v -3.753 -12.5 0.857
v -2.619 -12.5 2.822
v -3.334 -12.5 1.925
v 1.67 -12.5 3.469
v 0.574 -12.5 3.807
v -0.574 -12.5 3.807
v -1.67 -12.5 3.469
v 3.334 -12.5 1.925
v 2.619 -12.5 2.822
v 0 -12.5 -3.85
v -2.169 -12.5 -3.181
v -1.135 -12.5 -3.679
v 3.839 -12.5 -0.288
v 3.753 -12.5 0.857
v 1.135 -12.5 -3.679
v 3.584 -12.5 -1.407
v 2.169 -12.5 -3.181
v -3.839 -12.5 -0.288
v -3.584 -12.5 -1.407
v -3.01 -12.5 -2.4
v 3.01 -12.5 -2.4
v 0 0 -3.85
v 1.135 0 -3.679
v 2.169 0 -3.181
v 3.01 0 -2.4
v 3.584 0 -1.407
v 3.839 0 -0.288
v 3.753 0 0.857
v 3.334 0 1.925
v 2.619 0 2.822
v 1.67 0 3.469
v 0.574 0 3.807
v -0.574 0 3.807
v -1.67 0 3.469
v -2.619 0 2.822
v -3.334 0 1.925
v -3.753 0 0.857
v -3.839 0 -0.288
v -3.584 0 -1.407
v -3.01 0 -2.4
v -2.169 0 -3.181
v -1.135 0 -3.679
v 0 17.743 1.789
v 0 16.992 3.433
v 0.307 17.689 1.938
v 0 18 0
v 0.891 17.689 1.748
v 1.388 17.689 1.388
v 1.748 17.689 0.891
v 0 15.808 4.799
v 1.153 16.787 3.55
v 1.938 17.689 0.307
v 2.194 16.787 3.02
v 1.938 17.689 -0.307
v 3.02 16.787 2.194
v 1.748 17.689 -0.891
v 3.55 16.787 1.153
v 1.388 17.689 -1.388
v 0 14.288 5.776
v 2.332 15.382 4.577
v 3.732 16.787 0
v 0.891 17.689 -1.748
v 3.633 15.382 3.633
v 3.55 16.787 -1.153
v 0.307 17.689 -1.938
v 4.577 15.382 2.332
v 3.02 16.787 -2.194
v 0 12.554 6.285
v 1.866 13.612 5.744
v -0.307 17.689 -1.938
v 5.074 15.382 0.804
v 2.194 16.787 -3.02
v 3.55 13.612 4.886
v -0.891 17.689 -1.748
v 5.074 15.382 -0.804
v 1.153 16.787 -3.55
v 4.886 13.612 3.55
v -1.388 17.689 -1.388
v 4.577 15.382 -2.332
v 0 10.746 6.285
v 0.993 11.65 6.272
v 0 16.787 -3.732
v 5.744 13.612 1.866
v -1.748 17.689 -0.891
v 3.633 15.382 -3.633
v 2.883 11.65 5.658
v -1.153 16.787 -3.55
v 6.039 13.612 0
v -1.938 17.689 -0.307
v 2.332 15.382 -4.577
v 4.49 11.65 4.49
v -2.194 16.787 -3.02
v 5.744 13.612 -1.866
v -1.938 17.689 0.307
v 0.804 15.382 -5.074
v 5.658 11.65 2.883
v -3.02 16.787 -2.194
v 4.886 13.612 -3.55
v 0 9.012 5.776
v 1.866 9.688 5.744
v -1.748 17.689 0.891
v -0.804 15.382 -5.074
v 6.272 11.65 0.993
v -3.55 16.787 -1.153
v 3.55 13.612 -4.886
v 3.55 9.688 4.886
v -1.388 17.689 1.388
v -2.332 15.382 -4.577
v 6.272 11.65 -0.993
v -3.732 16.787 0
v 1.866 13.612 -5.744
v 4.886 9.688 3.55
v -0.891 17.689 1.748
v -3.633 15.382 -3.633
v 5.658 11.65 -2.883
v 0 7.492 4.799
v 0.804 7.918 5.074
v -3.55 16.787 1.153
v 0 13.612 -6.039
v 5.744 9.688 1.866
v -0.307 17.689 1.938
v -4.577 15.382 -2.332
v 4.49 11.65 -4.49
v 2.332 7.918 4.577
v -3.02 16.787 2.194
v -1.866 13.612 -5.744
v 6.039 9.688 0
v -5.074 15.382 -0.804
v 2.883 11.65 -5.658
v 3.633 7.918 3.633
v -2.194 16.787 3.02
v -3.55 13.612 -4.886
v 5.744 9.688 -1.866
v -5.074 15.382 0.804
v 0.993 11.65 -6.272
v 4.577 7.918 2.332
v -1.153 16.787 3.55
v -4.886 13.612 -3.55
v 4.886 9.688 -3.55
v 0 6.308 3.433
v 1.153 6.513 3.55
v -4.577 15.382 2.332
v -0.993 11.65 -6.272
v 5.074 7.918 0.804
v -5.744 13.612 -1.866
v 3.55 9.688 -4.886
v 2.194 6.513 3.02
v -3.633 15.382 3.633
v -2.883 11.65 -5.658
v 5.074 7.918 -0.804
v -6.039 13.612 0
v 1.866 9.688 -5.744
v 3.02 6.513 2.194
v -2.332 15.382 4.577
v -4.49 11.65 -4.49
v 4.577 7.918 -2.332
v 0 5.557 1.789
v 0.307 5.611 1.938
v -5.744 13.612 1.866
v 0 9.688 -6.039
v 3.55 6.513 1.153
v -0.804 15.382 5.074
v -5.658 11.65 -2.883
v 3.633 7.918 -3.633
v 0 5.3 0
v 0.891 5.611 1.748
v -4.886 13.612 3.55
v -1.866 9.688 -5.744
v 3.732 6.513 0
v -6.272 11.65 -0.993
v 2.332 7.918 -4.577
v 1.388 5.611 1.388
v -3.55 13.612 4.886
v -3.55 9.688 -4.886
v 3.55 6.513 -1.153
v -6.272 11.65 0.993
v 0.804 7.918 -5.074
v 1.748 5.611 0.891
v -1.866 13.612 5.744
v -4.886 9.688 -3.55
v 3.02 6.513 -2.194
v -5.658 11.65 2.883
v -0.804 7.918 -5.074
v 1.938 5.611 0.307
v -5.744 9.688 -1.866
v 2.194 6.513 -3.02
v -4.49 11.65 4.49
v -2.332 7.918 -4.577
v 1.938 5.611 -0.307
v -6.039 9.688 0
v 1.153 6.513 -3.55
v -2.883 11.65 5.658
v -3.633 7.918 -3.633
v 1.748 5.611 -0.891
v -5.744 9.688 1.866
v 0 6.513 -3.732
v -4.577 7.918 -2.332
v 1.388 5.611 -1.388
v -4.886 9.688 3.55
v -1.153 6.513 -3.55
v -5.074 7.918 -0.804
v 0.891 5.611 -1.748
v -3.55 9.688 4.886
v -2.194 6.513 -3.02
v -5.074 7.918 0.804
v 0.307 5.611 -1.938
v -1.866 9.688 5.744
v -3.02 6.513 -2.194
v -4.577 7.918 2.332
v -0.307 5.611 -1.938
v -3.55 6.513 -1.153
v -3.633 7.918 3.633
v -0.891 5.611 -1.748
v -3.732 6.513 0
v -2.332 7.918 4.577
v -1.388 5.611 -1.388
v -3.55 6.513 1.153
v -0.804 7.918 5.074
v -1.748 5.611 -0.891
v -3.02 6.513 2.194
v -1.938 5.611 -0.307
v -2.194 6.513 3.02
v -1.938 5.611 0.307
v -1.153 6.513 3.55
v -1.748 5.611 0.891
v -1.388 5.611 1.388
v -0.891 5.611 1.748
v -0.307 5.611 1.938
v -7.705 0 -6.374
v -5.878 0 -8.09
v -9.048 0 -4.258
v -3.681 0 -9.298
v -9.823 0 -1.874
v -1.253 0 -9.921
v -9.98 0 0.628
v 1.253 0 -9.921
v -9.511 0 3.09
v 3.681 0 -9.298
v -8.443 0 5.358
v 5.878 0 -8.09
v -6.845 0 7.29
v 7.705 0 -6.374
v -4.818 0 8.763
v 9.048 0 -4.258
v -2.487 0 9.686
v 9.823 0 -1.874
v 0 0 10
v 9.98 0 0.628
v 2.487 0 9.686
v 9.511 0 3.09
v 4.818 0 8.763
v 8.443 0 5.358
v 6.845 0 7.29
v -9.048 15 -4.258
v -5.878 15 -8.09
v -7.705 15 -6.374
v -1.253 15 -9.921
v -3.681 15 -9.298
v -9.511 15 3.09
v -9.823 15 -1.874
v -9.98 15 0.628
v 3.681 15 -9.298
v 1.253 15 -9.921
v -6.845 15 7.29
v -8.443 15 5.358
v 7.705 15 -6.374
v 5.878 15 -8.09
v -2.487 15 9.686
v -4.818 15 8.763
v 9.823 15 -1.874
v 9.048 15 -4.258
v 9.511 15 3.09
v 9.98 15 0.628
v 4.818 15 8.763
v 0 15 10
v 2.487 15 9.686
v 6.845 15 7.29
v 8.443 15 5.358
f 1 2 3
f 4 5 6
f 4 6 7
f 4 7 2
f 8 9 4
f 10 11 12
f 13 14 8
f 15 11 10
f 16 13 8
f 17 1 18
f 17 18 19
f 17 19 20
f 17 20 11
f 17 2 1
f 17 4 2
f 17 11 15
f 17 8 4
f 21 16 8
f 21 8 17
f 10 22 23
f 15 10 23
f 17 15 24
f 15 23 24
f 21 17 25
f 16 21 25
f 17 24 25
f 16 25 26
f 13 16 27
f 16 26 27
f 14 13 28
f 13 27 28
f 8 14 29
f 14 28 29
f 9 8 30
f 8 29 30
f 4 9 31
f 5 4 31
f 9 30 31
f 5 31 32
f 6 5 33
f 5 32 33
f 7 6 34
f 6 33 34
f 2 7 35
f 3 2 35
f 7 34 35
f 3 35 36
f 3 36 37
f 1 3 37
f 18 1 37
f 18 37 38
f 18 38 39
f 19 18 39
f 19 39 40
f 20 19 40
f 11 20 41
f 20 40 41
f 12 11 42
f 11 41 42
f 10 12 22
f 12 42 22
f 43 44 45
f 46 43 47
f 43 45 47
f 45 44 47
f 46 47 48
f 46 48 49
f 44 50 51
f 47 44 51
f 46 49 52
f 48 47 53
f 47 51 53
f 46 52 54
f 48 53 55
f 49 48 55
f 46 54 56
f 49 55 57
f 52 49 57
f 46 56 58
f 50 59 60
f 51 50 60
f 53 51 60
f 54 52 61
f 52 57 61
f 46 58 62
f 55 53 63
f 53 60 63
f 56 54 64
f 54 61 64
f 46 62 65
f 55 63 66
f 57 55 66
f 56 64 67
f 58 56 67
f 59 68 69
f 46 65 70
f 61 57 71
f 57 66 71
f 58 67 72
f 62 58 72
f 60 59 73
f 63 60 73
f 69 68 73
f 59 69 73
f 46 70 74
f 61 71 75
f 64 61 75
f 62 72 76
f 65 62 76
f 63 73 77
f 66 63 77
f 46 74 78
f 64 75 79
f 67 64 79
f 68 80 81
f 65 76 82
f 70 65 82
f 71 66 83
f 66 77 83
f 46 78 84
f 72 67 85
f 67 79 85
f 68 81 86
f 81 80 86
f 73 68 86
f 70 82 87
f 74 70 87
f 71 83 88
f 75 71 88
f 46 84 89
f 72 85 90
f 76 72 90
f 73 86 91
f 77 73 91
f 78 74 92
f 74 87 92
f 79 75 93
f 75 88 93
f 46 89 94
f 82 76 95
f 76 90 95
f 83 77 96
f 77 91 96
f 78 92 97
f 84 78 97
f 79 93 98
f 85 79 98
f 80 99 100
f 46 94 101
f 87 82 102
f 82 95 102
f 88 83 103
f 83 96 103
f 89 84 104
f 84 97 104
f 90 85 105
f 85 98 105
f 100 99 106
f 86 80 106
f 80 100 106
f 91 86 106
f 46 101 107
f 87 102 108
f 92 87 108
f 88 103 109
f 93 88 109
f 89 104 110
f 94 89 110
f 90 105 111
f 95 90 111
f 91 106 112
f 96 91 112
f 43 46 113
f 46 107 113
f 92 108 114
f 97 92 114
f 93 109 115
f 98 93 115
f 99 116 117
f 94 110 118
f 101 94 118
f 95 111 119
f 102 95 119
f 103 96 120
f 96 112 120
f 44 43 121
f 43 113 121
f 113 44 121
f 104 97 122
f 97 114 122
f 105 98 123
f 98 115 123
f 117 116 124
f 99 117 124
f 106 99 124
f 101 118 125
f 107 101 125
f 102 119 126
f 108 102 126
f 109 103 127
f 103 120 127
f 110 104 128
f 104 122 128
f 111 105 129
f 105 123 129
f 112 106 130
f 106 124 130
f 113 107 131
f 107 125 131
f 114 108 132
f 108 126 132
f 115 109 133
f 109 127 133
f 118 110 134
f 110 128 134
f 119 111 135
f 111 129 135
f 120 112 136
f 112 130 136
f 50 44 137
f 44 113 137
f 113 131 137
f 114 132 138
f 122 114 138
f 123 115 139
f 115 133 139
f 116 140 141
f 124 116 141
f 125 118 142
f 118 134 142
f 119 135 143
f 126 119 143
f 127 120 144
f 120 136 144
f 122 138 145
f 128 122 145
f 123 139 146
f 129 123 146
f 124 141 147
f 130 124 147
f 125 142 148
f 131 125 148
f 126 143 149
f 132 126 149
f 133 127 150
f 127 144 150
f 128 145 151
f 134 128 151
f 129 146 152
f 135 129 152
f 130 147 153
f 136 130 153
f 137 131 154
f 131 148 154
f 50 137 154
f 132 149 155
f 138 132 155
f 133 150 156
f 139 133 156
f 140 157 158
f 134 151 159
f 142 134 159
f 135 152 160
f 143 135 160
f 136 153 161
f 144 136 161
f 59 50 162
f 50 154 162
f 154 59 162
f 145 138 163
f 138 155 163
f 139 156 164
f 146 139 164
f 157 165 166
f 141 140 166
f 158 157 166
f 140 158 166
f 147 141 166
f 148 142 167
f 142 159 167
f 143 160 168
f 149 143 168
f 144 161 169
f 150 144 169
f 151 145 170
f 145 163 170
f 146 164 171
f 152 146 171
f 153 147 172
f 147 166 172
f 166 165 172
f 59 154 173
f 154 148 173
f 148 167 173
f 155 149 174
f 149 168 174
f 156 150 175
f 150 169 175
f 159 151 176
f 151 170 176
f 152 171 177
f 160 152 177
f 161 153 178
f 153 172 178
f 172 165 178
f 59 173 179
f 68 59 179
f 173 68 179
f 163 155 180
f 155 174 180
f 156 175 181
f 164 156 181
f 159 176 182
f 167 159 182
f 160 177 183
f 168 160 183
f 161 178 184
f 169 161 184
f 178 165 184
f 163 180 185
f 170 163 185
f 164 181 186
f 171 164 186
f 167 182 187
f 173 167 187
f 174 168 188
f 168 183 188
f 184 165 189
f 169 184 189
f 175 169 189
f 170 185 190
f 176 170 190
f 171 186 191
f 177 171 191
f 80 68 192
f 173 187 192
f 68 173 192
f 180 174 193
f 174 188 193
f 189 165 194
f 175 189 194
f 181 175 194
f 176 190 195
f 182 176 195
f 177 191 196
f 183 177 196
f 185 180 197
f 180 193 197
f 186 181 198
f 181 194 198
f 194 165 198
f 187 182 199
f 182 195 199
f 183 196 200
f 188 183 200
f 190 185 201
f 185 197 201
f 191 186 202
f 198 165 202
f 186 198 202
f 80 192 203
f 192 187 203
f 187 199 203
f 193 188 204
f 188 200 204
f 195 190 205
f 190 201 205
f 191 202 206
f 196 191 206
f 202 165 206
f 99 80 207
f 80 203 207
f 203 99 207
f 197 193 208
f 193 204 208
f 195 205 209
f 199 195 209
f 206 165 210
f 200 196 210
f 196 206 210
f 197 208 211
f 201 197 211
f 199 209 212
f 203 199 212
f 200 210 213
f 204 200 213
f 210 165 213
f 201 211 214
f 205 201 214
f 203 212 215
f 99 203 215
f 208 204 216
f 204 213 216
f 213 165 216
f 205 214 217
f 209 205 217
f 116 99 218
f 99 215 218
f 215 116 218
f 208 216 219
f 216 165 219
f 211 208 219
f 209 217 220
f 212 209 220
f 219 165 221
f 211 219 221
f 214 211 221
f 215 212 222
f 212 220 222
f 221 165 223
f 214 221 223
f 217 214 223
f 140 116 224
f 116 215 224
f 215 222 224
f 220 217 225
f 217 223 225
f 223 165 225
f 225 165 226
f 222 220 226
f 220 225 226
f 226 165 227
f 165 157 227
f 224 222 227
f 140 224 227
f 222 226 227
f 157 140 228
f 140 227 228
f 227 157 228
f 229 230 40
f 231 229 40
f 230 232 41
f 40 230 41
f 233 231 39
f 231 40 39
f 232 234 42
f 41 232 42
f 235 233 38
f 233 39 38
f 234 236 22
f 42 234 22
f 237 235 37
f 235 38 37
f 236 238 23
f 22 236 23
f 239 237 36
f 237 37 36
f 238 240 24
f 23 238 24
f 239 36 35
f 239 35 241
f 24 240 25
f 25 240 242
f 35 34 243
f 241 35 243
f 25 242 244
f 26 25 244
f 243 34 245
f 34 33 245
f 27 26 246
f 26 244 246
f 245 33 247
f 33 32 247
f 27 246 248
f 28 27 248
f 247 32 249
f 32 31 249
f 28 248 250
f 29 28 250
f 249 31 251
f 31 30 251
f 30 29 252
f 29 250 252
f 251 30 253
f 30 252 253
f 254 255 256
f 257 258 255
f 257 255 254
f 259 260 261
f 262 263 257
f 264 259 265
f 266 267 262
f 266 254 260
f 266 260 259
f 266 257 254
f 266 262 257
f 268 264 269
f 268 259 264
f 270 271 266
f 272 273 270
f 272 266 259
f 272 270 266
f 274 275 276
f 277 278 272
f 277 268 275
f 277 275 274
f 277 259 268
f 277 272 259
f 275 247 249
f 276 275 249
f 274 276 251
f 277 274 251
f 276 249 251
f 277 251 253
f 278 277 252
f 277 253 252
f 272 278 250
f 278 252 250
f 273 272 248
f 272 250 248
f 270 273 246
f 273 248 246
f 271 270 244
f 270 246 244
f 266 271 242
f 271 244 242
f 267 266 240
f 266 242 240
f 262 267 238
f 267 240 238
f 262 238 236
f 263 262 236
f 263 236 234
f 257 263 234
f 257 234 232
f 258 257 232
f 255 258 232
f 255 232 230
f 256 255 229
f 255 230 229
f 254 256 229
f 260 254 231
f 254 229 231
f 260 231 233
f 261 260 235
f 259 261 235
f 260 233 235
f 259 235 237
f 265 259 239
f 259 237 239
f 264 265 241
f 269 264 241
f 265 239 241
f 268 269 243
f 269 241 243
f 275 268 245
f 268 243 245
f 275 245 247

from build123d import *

# Parameters (mm, degrees)
ESQUISSE1_R        = 10
BOSS_EXTRU_1_DEPTH = 15
ESQUISSE3_R        = 3.85
BOSS_EXTRU_2_DEPTH = 12.5


with BuildPart() as part:
    # Esquisse1 → Boss.-Extru.1 (new body)
    with BuildSketch(Plane(origin=(0, 0, 0), x_dir=(1, 0, 0), z_dir=(0, 1, 0))):
        with Locations(Location((0, 0, 0), (0, 0, 270))):
            Circle(ESQUISSE1_R)
    extrude(amount=BOSS_EXTRU_1_DEPTH)

    # Esquisse3 → Boss.-Extru.2 (add)
    with BuildSketch(Plane.XZ):
        with Locations(Location((0, 0, 0), (0, 0, 270))):
            Circle(ESQUISSE3_R)
    extrude(amount=BOSS_EXTRU_2_DEPTH)


with BuildPart() as body_2:
    # Esquisse2 → Révolution6 (revolve)
    with BuildSketch(Plane(origin=(0, 0, 0), x_dir=(0, 0, -1), z_dir=(1, 0, 0))):
        with BuildLine():
            Line((0, 5.3), (0, 18))
            ThreePointArc((0, 18), (-6.35, 11.65), (0, 5.3))
        make_face()
    revolve(axis=Axis((0, 0, 0), (0, 1, 0)))


solid = Compound([part.part, body_2.part])
